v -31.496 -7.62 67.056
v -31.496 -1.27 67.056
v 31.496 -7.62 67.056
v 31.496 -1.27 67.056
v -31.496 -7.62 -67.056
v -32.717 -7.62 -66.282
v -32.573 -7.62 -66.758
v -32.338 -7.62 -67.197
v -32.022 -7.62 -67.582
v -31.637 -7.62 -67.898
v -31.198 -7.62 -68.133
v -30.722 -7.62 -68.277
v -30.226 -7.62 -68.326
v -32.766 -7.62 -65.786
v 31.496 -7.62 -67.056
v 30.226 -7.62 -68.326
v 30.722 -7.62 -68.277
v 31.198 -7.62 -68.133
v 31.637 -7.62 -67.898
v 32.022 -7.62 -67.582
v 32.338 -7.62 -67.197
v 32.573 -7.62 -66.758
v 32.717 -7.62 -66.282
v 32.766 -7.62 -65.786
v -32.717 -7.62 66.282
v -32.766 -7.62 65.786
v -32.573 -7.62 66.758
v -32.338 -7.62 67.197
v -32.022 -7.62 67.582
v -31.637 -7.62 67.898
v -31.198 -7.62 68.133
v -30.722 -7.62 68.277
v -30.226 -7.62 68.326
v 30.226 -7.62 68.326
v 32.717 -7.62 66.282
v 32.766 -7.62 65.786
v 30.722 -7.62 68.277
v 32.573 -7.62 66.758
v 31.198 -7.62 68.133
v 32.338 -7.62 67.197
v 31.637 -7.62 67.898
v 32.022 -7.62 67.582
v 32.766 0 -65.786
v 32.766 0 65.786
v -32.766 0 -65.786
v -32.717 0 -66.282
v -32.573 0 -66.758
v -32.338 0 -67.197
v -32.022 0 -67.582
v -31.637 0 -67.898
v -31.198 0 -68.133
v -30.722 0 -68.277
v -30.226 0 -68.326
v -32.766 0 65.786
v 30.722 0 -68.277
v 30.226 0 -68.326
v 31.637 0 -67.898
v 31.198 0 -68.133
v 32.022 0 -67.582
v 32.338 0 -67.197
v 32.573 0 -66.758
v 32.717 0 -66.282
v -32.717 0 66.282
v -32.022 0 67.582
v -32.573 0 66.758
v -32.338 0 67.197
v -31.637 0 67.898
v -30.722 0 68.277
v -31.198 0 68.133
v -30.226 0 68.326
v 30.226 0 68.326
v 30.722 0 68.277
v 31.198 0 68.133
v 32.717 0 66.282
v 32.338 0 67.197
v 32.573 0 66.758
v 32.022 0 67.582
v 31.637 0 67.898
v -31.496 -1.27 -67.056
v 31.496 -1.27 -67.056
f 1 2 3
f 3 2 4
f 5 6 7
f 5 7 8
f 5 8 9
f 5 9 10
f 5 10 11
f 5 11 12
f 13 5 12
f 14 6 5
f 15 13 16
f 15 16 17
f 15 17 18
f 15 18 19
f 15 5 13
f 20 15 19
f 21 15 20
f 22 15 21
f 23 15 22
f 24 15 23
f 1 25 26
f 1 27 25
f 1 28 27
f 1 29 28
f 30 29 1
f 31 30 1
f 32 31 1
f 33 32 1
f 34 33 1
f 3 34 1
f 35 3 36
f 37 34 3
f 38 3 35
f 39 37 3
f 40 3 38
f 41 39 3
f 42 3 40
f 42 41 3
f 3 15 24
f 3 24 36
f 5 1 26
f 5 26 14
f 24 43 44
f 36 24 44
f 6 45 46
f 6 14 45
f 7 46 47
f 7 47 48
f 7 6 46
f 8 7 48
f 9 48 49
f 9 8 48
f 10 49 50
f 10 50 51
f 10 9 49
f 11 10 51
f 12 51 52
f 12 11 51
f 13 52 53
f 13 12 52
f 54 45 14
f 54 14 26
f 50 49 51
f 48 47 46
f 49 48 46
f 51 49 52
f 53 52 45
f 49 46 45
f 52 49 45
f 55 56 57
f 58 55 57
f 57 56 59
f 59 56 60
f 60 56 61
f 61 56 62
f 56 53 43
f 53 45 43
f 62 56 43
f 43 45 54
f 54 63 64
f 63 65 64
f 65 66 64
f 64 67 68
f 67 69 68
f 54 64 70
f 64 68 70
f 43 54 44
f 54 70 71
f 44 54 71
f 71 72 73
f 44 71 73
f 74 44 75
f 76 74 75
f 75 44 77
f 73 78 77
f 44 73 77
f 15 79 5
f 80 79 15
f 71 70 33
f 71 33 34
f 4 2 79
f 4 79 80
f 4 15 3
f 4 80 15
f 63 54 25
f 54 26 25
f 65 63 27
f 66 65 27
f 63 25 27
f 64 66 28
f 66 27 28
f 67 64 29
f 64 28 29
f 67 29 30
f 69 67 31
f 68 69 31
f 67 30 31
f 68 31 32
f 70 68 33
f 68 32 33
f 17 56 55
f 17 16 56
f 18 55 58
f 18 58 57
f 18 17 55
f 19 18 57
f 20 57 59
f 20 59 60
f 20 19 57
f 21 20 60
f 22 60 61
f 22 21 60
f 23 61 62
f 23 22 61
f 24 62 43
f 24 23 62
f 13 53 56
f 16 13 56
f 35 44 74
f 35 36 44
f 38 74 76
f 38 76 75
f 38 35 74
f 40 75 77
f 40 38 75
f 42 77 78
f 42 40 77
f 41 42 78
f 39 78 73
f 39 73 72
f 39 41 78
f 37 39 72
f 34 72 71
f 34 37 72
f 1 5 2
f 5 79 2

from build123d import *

# Parameters (mm, degrees)
F0_W     = 65.532
F0_H     = 136.652
F1_DEPTH = 7.62
F2_T     = -1.27
F3_R     = 2.54


with BuildPart() as f1:
    # F0 (on Front) → F1 (new body)
    with BuildSketch(Plane.XZ):
        Rectangle(F0_W, F0_H)
    extrude(amount=F1_DEPTH)

    # F2
    f2_openings = [f1.faces().sort_by_distance(p)[0] for p in [
        (0, -7.62, 0),
    ]]
    offset(amount=F2_T, openings=f2_openings)

    # F3
    f3_edges = [f1.edges().sort_by_distance(p)[0] for p in [
        (-32.766, -3.81, -68.326),
        (32.766, -3.81, -68.326),
        (32.766, -3.81, 68.326),
        (-32.766, -3.81, 68.326),
    ]]
    fillet(f3_edges, radius=F3_R)


solid = f1.part
